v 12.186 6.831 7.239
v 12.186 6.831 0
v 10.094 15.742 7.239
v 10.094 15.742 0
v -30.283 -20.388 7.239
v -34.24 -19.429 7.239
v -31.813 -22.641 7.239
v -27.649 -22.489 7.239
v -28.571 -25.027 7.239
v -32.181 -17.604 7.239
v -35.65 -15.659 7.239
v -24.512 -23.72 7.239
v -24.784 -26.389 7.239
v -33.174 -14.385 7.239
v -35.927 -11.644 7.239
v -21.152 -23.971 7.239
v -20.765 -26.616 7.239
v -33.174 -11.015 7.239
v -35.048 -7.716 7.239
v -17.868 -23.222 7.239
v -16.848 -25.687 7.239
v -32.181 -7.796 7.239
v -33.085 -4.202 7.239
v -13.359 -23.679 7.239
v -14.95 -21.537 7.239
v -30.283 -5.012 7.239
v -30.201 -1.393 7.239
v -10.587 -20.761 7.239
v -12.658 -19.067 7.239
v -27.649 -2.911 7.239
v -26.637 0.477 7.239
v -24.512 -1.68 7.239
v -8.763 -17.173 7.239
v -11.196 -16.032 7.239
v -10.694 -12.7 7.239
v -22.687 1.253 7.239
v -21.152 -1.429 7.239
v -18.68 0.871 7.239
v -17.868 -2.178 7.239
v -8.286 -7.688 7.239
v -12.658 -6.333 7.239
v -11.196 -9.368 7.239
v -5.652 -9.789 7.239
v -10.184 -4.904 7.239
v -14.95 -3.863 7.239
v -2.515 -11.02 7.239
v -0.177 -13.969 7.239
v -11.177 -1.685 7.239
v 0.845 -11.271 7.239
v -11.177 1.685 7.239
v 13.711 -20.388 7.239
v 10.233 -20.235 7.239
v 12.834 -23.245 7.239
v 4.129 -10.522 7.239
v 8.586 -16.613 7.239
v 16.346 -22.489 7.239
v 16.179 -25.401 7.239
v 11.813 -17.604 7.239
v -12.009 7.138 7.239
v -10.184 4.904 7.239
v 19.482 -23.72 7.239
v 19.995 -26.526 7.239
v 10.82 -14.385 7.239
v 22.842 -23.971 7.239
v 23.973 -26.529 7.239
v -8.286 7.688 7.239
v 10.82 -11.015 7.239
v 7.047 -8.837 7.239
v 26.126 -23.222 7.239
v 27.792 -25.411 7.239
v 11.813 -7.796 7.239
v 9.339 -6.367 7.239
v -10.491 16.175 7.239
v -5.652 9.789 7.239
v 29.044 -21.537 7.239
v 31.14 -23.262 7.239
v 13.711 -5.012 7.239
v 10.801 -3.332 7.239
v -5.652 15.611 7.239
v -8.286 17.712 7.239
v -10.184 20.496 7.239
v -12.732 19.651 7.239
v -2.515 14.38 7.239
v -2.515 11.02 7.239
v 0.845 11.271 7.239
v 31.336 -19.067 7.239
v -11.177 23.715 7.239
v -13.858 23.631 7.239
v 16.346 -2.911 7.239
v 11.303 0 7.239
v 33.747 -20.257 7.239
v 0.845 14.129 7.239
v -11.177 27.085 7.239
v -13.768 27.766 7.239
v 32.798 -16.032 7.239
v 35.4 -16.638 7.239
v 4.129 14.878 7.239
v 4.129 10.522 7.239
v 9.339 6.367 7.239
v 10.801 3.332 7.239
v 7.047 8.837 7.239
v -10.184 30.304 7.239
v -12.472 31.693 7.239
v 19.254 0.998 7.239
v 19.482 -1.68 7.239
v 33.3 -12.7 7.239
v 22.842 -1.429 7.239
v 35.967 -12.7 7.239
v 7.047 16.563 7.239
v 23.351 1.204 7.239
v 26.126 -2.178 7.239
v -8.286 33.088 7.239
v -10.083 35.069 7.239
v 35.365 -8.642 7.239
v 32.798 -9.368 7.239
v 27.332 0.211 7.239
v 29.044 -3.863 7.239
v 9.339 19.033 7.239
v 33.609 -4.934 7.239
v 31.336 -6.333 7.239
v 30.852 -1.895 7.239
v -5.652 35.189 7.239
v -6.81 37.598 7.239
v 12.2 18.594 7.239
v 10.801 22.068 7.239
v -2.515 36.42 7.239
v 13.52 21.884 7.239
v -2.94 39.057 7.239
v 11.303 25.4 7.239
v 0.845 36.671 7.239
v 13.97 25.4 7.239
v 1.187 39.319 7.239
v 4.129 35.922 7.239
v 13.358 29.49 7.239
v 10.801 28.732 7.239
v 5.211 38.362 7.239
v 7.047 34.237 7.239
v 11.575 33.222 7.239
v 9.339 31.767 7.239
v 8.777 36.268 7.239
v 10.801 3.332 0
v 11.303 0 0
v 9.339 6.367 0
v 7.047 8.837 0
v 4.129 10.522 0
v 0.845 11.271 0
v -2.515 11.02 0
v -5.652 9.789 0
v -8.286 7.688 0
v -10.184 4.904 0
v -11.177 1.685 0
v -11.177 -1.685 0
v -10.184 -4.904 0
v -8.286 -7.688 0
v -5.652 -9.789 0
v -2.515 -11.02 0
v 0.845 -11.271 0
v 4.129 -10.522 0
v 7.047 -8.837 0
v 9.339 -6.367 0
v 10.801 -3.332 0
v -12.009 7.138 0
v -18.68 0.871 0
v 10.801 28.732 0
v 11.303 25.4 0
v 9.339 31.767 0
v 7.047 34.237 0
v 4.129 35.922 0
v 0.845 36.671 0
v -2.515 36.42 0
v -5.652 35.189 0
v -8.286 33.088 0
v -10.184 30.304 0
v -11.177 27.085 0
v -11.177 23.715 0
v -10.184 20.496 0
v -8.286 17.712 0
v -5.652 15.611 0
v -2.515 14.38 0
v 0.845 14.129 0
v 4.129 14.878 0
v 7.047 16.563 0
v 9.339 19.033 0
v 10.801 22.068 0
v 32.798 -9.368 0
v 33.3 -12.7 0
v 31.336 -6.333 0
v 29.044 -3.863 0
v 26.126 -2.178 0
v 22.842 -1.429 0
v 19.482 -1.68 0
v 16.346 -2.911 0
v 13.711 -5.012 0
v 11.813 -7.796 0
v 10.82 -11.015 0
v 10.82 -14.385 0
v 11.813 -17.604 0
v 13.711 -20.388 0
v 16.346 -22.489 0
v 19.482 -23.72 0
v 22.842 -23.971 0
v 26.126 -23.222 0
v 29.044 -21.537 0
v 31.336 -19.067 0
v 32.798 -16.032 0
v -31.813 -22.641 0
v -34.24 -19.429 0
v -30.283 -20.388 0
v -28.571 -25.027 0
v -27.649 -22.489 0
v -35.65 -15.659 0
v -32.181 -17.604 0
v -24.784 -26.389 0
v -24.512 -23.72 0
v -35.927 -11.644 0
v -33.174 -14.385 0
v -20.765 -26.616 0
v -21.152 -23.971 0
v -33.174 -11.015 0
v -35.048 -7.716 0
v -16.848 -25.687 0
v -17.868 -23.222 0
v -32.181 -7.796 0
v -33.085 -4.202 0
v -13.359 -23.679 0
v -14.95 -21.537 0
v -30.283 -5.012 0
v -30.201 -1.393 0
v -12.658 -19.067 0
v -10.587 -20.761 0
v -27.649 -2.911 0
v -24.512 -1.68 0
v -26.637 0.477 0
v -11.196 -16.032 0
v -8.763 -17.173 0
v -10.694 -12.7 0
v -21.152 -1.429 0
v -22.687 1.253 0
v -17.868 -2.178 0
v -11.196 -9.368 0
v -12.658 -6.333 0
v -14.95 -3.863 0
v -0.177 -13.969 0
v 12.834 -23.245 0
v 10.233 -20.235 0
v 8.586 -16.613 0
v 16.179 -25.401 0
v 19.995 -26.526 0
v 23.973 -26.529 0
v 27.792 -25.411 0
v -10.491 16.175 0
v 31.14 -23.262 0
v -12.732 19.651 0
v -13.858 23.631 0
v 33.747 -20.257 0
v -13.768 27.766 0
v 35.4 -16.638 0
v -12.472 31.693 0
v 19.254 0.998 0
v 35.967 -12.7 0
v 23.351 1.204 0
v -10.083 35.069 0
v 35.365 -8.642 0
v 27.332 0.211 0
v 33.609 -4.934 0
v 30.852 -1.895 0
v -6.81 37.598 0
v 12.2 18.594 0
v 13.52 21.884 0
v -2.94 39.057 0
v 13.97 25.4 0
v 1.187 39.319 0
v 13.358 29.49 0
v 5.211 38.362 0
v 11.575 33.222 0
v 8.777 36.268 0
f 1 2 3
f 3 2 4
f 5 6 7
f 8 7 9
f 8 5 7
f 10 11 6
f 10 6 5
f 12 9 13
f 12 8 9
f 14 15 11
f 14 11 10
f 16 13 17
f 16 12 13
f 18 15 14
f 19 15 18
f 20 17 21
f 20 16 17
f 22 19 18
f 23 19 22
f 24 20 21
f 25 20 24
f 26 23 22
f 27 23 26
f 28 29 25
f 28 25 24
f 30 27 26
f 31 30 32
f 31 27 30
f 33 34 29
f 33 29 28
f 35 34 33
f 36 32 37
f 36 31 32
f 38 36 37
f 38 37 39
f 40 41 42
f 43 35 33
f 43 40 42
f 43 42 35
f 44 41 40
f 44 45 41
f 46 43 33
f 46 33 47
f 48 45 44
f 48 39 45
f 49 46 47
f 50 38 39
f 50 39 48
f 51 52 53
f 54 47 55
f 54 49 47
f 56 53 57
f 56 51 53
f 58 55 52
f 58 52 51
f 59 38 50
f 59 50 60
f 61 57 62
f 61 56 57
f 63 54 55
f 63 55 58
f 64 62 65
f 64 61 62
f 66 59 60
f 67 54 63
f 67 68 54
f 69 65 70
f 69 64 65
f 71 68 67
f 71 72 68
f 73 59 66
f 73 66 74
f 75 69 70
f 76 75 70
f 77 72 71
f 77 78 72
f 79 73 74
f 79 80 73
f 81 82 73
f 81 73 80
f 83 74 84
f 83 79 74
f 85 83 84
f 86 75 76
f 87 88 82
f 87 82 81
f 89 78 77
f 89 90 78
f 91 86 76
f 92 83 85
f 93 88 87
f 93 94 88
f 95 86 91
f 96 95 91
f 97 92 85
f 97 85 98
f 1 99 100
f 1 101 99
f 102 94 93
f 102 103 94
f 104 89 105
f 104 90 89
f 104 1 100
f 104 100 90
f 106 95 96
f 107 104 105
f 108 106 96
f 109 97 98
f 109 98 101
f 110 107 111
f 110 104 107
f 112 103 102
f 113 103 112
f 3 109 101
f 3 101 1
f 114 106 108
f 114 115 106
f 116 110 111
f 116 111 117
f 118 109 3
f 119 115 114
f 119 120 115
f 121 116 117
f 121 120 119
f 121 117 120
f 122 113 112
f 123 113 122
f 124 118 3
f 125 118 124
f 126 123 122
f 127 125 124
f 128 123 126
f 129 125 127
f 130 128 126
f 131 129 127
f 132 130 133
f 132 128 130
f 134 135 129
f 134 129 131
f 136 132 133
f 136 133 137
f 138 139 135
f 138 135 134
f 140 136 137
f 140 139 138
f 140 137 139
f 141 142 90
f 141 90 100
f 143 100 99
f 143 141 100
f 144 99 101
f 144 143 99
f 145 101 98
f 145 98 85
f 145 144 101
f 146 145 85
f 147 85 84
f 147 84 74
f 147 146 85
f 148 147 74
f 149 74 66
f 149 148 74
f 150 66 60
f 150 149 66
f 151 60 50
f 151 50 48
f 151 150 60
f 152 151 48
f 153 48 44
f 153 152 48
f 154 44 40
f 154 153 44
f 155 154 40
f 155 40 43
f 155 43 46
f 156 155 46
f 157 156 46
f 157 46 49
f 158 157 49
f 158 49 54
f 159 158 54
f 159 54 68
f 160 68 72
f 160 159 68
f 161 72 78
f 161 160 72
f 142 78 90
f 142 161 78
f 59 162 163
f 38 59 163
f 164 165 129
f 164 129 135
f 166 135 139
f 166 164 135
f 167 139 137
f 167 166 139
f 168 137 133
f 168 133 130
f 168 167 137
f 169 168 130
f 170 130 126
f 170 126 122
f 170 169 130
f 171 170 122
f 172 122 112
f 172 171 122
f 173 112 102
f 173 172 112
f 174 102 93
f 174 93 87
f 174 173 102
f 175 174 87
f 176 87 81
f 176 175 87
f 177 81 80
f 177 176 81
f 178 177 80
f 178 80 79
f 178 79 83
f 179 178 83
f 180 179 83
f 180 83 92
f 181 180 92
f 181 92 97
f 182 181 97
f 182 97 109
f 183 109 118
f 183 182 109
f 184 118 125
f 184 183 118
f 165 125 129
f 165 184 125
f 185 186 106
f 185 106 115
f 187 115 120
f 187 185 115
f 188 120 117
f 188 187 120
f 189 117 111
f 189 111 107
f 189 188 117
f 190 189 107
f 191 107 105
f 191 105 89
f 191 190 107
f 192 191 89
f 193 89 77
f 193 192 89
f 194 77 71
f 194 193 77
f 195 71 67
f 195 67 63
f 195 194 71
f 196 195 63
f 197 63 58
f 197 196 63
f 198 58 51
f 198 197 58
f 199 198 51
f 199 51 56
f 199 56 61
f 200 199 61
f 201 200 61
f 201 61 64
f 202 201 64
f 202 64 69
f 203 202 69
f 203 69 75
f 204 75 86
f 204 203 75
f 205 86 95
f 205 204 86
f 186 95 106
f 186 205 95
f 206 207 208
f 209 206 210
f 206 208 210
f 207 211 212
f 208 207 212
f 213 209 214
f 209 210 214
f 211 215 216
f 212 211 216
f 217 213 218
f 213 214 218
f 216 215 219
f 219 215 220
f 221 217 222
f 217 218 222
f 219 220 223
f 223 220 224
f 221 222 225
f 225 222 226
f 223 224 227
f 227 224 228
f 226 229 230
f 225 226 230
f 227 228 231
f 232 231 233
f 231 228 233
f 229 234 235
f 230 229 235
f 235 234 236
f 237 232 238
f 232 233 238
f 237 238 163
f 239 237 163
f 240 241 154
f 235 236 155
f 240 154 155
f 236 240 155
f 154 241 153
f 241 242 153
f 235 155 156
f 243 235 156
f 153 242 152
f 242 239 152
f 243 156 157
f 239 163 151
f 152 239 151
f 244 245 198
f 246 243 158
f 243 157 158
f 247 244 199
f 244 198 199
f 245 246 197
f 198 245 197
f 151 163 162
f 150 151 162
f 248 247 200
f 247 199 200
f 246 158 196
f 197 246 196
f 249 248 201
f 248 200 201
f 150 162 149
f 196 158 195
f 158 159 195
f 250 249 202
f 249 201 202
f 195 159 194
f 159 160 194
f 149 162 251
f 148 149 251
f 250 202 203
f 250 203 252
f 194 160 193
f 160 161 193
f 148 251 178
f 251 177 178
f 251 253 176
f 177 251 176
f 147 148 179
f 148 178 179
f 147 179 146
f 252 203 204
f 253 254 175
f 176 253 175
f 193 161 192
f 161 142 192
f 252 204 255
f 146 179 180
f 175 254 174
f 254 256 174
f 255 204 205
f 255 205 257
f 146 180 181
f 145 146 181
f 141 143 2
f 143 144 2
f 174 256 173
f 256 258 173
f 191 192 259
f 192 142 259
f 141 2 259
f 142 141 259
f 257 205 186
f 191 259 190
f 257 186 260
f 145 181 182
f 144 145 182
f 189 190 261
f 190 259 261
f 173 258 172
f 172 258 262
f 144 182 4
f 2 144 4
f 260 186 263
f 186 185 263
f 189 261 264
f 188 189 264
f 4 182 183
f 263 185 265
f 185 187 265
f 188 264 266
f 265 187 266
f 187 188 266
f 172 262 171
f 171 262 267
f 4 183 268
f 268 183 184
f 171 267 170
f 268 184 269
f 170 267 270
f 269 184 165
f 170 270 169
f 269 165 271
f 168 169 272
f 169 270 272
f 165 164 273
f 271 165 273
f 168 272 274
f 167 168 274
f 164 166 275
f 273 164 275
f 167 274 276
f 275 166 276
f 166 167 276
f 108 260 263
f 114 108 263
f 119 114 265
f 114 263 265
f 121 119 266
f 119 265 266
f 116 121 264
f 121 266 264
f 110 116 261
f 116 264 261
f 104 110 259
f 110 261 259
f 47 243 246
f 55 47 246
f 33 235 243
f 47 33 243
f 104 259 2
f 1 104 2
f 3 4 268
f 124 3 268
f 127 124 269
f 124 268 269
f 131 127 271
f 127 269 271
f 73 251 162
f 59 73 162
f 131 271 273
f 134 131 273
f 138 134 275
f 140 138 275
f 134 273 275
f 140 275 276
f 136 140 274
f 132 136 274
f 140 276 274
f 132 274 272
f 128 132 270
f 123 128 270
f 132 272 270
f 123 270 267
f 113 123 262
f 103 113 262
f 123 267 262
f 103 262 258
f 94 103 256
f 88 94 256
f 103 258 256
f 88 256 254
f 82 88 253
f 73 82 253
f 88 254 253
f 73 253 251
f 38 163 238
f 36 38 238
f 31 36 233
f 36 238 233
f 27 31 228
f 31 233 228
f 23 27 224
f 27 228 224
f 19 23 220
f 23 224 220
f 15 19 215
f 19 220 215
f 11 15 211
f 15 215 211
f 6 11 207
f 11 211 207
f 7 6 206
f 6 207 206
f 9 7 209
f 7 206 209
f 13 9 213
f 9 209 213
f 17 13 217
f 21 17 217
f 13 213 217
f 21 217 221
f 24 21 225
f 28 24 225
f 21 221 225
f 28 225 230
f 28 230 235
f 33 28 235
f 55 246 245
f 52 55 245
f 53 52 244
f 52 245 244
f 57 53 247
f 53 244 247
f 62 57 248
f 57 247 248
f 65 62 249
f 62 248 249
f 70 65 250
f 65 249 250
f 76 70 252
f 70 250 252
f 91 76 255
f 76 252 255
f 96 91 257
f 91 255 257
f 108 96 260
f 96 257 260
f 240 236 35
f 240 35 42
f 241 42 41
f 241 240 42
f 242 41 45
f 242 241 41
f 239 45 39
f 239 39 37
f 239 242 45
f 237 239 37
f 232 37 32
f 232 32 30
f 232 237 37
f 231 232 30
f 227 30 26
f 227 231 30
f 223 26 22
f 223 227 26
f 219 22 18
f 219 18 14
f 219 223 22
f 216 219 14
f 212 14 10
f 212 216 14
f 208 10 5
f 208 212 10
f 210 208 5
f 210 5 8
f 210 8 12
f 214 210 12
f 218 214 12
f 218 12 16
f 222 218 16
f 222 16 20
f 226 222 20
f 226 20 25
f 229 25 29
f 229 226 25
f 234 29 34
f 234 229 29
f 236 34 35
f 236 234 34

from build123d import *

# Parameters (mm, degrees)
F0_R     = 11.303
F1_DEPTH = 7.239


# Not quite as in the source:
# - a feature names something its author has since deleted; it is built from what else it names


with BuildPart() as f1:
    # F0 (on Top) → F1 (new body)
    with BuildSketch(Plane.XY):
        with BuildLine():
            ThreePointArc((-5.8198711326, 12.7), (0, 13.97), (5.8198711326, 12.7))
            ThreePointArc((5.8198711326, 12.7), (8.1011295792, 14.0187610718), (10.0941728301, 15.7424343193))
            ThreePointArc((10.0941728301, 15.7424343193), (12.9648851602, 20.1968612567), (13.97, 25.4))
            ThreePointArc((13.97, 25.4), (-4.9295356548, 38.4713648189), (-10.4910706124, 16.1751239897))
            ThreePointArc((-10.4910706124, 16.1751239897), (-8.3385146662, 14.191517803), (-5.8198711326, 12.7))
        make_face()
        with Locations((0, 25.4)):
            Circle(F0_R, mode=Mode.SUBTRACT)
        with BuildLine():
            ThreePointArc((19.2536035907, 0.9979716684), (16.4594722687, 0.1256066293), (13.9084581944, -1.3098437524))
            ThreePointArc((13.9084581944, -1.3098437524), (12.0983748909, -6.985), (8.0885870618, -11.3901562476))
            ThreePointArc((8.0885870618, -11.3901562476), (8.0900384281, -14.0251645508), (8.5862616229, -16.6130272607))
            ThreePointArc((8.5862616229, -16.6130272607), (23.9734375051, -26.5294892776), (35.9670452561, -12.7))
            ThreePointArc((35.9670452561, -12.7), (30.852411424, -1.8952144846), (19.2536035907, 0.9979716684))
        make_face()
        with Locations((21.9970452561, -12.7)):
            Circle(F0_R, mode=Mode.SUBTRACT)
        with BuildLine():
            ThreePointArc((-8.0270452561, -12.7), (-8.042439189, -12.044355651), (-8.0885870618, -11.3901562476))
            ThreePointArc((-8.0885870618, -11.3901562476), (-12.0983748909, -6.985), (-13.9084581944, -1.3098437524))
            ThreePointArc((-13.9084581944, -1.3098437524), (-16.1911680073, 0.006403479), (-18.680434453, 0.8705929414))
            ThreePointArc((-18.680434453, 0.8705929414), (-34.2395365622, -19.4292129272), (-8.7625329783, -17.1730956581))
            ThreePointArc((-8.7625329783, -17.1730956581), (-8.2121434334, -14.9665793035), (-8.0270452561, -12.7))
        make_face()
        with Locations((-21.9970452561, -12.7)):
            Circle(F0_R, mode=Mode.SUBTRACT)
        with BuildLine():
            ThreePointArc((13.9084581944, -1.3098437524), (13.9546060671, -0.655644349), (13.97, 0))
            ThreePointArc((13.97, 0), (13.5166645575, 3.5299687308), (12.1860802806, 6.8308379717))
            ThreePointArc((12.1860802806, 6.8308379717), (9.4691782802, 10.2711032853), (5.8198711326, 12.7))
            ThreePointArc((5.8198711326, 12.7), (0, 11.43), (-5.8198711326, 12.7))
            ThreePointArc((-5.8198711326, 12.7), (-9.3380147919, 10.3904946824), (-12.0087193529, 7.1380361097))
            ThreePointArc((-12.0087193529, 7.1380361097), (-13.6296255101, 3.0649973009), (-13.9084581944, -1.3098437524))
            ThreePointArc((-13.9084581944, -1.3098437524), (-9.8986703653, -5.715), (-8.0885870618, -11.3901562476))
            ThreePointArc((-8.0885870618, -11.3901562476), (-4.3294249569, -13.2822053719), (-0.1773609276, -13.9688740814))
            ThreePointArc((-0.1773609276, -13.9688740814), (4.1604472299, -13.3361005863), (8.0885870618, -11.3901562476))
            ThreePointArc((8.0885870618, -11.3901562476), (9.8986703653, -5.715), (13.9084581944, -1.3098437524))
        make_face()
        Circle(F0_R, mode=Mode.SUBTRACT)
        with BuildLine():
            ThreePointArc((-13.9084581944, -1.3098437524), (-13.6296255101, 3.0649973009), (-12.0087193529, 7.1380361097))
            Line((-12.0087193529, 7.1380361097), (-18.680434453, 0.8705929414))
            ThreePointArc((-18.680434453, 0.8705929414), (-16.1911680073, 0.006403479), (-13.9084581944, -1.3098437524))
        make_face()
        with BuildLine():
            ThreePointArc((-12.0087193529, 7.1380361097), (-9.3380147919, 10.3904946824), (-5.8198711326, 12.7))
            ThreePointArc((-5.8198711326, 12.7), (-8.3385146662, 14.191517803), (-10.4910706124, 16.1751239897))
            Line((-10.4910706124, 16.1751239897), (-12.0087193529, 7.1380361097))
        make_face()
        with BuildLine():
            ThreePointArc((5.8198711326, 12.7), (9.4691782802, 10.2711032853), (12.1860802806, 6.8308379717))
            Line((12.1860802806, 6.8308379717), (10.0941728301, 15.7424343193))
            ThreePointArc((10.0941728301, 15.7424343193), (8.1011295792, 14.0187610718), (5.8198711326, 12.7))
        make_face()
        with BuildLine():
            ThreePointArc((12.1860802806, 6.8308379717), (13.5166645575, 3.5299687308), (13.97, 0))
            ThreePointArc((13.97, 0), (13.9546060671, -0.655644349), (13.9084581944, -1.3098437524))
            ThreePointArc((13.9084581944, -1.3098437524), (16.4594722687, 0.1256066293), (19.2536035907, 0.9979716684))
            Line((19.2536035907, 0.9979716684), (12.1860802806, 6.8308379717))
        make_face()
        with BuildLine():
            ThreePointArc((8.5862616229, -16.6130272607), (8.0900384281, -14.0251645508), (8.0885870618, -11.3901562476))
            ThreePointArc((8.0885870618, -11.3901562476), (4.1604472299, -13.3361005863), (-0.1773609276, -13.9688740814))
            Line((-0.1773609276, -13.9688740814), (8.5862616229, -16.6130272607))
        make_face()
        with BuildLine():
            Line((-8.7625329783, -17.1730956581), (-0.1773609276, -13.9688740814))
            ThreePointArc((-0.1773609276, -13.9688740814), (-4.3294249569, -13.2822053719), (-8.0885870618, -11.3901562476))
            ThreePointArc((-8.0885870618, -11.3901562476), (-8.042439189, -12.044355651), (-8.0270452561, -12.7))
            ThreePointArc((-8.0270452561, -12.7), (-8.2121434334, -14.9665793035), (-8.7625329783, -17.1730956581))
        make_face()
        with BuildLine():
            ThreePointArc((8.0885870618, -11.3901562476), (12.0983748909, -6.985), (13.9084581944, -1.3098437524))
            ThreePointArc((13.9084581944, -1.3098437524), (9.8986703653, -5.715), (8.0885870618, -11.3901562476))
        make_face()
        with BuildLine():
            ThreePointArc((-5.8198711326, 12.7), (0, 11.43), (5.8198711326, 12.7))
            ThreePointArc((5.8198711326, 12.7), (0, 13.97), (-5.8198711326, 12.7))
        make_face()
        with BuildLine():
            ThreePointArc((-13.9084581944, -1.3098437524), (-12.0983748909, -6.985), (-8.0885870618, -11.3901562476))
            ThreePointArc((-8.0885870618, -11.3901562476), (-9.8986703653, -5.715), (-13.9084581944, -1.3098437524))
        make_face()
    extrude(amount=F1_DEPTH)


solid = f1.part
